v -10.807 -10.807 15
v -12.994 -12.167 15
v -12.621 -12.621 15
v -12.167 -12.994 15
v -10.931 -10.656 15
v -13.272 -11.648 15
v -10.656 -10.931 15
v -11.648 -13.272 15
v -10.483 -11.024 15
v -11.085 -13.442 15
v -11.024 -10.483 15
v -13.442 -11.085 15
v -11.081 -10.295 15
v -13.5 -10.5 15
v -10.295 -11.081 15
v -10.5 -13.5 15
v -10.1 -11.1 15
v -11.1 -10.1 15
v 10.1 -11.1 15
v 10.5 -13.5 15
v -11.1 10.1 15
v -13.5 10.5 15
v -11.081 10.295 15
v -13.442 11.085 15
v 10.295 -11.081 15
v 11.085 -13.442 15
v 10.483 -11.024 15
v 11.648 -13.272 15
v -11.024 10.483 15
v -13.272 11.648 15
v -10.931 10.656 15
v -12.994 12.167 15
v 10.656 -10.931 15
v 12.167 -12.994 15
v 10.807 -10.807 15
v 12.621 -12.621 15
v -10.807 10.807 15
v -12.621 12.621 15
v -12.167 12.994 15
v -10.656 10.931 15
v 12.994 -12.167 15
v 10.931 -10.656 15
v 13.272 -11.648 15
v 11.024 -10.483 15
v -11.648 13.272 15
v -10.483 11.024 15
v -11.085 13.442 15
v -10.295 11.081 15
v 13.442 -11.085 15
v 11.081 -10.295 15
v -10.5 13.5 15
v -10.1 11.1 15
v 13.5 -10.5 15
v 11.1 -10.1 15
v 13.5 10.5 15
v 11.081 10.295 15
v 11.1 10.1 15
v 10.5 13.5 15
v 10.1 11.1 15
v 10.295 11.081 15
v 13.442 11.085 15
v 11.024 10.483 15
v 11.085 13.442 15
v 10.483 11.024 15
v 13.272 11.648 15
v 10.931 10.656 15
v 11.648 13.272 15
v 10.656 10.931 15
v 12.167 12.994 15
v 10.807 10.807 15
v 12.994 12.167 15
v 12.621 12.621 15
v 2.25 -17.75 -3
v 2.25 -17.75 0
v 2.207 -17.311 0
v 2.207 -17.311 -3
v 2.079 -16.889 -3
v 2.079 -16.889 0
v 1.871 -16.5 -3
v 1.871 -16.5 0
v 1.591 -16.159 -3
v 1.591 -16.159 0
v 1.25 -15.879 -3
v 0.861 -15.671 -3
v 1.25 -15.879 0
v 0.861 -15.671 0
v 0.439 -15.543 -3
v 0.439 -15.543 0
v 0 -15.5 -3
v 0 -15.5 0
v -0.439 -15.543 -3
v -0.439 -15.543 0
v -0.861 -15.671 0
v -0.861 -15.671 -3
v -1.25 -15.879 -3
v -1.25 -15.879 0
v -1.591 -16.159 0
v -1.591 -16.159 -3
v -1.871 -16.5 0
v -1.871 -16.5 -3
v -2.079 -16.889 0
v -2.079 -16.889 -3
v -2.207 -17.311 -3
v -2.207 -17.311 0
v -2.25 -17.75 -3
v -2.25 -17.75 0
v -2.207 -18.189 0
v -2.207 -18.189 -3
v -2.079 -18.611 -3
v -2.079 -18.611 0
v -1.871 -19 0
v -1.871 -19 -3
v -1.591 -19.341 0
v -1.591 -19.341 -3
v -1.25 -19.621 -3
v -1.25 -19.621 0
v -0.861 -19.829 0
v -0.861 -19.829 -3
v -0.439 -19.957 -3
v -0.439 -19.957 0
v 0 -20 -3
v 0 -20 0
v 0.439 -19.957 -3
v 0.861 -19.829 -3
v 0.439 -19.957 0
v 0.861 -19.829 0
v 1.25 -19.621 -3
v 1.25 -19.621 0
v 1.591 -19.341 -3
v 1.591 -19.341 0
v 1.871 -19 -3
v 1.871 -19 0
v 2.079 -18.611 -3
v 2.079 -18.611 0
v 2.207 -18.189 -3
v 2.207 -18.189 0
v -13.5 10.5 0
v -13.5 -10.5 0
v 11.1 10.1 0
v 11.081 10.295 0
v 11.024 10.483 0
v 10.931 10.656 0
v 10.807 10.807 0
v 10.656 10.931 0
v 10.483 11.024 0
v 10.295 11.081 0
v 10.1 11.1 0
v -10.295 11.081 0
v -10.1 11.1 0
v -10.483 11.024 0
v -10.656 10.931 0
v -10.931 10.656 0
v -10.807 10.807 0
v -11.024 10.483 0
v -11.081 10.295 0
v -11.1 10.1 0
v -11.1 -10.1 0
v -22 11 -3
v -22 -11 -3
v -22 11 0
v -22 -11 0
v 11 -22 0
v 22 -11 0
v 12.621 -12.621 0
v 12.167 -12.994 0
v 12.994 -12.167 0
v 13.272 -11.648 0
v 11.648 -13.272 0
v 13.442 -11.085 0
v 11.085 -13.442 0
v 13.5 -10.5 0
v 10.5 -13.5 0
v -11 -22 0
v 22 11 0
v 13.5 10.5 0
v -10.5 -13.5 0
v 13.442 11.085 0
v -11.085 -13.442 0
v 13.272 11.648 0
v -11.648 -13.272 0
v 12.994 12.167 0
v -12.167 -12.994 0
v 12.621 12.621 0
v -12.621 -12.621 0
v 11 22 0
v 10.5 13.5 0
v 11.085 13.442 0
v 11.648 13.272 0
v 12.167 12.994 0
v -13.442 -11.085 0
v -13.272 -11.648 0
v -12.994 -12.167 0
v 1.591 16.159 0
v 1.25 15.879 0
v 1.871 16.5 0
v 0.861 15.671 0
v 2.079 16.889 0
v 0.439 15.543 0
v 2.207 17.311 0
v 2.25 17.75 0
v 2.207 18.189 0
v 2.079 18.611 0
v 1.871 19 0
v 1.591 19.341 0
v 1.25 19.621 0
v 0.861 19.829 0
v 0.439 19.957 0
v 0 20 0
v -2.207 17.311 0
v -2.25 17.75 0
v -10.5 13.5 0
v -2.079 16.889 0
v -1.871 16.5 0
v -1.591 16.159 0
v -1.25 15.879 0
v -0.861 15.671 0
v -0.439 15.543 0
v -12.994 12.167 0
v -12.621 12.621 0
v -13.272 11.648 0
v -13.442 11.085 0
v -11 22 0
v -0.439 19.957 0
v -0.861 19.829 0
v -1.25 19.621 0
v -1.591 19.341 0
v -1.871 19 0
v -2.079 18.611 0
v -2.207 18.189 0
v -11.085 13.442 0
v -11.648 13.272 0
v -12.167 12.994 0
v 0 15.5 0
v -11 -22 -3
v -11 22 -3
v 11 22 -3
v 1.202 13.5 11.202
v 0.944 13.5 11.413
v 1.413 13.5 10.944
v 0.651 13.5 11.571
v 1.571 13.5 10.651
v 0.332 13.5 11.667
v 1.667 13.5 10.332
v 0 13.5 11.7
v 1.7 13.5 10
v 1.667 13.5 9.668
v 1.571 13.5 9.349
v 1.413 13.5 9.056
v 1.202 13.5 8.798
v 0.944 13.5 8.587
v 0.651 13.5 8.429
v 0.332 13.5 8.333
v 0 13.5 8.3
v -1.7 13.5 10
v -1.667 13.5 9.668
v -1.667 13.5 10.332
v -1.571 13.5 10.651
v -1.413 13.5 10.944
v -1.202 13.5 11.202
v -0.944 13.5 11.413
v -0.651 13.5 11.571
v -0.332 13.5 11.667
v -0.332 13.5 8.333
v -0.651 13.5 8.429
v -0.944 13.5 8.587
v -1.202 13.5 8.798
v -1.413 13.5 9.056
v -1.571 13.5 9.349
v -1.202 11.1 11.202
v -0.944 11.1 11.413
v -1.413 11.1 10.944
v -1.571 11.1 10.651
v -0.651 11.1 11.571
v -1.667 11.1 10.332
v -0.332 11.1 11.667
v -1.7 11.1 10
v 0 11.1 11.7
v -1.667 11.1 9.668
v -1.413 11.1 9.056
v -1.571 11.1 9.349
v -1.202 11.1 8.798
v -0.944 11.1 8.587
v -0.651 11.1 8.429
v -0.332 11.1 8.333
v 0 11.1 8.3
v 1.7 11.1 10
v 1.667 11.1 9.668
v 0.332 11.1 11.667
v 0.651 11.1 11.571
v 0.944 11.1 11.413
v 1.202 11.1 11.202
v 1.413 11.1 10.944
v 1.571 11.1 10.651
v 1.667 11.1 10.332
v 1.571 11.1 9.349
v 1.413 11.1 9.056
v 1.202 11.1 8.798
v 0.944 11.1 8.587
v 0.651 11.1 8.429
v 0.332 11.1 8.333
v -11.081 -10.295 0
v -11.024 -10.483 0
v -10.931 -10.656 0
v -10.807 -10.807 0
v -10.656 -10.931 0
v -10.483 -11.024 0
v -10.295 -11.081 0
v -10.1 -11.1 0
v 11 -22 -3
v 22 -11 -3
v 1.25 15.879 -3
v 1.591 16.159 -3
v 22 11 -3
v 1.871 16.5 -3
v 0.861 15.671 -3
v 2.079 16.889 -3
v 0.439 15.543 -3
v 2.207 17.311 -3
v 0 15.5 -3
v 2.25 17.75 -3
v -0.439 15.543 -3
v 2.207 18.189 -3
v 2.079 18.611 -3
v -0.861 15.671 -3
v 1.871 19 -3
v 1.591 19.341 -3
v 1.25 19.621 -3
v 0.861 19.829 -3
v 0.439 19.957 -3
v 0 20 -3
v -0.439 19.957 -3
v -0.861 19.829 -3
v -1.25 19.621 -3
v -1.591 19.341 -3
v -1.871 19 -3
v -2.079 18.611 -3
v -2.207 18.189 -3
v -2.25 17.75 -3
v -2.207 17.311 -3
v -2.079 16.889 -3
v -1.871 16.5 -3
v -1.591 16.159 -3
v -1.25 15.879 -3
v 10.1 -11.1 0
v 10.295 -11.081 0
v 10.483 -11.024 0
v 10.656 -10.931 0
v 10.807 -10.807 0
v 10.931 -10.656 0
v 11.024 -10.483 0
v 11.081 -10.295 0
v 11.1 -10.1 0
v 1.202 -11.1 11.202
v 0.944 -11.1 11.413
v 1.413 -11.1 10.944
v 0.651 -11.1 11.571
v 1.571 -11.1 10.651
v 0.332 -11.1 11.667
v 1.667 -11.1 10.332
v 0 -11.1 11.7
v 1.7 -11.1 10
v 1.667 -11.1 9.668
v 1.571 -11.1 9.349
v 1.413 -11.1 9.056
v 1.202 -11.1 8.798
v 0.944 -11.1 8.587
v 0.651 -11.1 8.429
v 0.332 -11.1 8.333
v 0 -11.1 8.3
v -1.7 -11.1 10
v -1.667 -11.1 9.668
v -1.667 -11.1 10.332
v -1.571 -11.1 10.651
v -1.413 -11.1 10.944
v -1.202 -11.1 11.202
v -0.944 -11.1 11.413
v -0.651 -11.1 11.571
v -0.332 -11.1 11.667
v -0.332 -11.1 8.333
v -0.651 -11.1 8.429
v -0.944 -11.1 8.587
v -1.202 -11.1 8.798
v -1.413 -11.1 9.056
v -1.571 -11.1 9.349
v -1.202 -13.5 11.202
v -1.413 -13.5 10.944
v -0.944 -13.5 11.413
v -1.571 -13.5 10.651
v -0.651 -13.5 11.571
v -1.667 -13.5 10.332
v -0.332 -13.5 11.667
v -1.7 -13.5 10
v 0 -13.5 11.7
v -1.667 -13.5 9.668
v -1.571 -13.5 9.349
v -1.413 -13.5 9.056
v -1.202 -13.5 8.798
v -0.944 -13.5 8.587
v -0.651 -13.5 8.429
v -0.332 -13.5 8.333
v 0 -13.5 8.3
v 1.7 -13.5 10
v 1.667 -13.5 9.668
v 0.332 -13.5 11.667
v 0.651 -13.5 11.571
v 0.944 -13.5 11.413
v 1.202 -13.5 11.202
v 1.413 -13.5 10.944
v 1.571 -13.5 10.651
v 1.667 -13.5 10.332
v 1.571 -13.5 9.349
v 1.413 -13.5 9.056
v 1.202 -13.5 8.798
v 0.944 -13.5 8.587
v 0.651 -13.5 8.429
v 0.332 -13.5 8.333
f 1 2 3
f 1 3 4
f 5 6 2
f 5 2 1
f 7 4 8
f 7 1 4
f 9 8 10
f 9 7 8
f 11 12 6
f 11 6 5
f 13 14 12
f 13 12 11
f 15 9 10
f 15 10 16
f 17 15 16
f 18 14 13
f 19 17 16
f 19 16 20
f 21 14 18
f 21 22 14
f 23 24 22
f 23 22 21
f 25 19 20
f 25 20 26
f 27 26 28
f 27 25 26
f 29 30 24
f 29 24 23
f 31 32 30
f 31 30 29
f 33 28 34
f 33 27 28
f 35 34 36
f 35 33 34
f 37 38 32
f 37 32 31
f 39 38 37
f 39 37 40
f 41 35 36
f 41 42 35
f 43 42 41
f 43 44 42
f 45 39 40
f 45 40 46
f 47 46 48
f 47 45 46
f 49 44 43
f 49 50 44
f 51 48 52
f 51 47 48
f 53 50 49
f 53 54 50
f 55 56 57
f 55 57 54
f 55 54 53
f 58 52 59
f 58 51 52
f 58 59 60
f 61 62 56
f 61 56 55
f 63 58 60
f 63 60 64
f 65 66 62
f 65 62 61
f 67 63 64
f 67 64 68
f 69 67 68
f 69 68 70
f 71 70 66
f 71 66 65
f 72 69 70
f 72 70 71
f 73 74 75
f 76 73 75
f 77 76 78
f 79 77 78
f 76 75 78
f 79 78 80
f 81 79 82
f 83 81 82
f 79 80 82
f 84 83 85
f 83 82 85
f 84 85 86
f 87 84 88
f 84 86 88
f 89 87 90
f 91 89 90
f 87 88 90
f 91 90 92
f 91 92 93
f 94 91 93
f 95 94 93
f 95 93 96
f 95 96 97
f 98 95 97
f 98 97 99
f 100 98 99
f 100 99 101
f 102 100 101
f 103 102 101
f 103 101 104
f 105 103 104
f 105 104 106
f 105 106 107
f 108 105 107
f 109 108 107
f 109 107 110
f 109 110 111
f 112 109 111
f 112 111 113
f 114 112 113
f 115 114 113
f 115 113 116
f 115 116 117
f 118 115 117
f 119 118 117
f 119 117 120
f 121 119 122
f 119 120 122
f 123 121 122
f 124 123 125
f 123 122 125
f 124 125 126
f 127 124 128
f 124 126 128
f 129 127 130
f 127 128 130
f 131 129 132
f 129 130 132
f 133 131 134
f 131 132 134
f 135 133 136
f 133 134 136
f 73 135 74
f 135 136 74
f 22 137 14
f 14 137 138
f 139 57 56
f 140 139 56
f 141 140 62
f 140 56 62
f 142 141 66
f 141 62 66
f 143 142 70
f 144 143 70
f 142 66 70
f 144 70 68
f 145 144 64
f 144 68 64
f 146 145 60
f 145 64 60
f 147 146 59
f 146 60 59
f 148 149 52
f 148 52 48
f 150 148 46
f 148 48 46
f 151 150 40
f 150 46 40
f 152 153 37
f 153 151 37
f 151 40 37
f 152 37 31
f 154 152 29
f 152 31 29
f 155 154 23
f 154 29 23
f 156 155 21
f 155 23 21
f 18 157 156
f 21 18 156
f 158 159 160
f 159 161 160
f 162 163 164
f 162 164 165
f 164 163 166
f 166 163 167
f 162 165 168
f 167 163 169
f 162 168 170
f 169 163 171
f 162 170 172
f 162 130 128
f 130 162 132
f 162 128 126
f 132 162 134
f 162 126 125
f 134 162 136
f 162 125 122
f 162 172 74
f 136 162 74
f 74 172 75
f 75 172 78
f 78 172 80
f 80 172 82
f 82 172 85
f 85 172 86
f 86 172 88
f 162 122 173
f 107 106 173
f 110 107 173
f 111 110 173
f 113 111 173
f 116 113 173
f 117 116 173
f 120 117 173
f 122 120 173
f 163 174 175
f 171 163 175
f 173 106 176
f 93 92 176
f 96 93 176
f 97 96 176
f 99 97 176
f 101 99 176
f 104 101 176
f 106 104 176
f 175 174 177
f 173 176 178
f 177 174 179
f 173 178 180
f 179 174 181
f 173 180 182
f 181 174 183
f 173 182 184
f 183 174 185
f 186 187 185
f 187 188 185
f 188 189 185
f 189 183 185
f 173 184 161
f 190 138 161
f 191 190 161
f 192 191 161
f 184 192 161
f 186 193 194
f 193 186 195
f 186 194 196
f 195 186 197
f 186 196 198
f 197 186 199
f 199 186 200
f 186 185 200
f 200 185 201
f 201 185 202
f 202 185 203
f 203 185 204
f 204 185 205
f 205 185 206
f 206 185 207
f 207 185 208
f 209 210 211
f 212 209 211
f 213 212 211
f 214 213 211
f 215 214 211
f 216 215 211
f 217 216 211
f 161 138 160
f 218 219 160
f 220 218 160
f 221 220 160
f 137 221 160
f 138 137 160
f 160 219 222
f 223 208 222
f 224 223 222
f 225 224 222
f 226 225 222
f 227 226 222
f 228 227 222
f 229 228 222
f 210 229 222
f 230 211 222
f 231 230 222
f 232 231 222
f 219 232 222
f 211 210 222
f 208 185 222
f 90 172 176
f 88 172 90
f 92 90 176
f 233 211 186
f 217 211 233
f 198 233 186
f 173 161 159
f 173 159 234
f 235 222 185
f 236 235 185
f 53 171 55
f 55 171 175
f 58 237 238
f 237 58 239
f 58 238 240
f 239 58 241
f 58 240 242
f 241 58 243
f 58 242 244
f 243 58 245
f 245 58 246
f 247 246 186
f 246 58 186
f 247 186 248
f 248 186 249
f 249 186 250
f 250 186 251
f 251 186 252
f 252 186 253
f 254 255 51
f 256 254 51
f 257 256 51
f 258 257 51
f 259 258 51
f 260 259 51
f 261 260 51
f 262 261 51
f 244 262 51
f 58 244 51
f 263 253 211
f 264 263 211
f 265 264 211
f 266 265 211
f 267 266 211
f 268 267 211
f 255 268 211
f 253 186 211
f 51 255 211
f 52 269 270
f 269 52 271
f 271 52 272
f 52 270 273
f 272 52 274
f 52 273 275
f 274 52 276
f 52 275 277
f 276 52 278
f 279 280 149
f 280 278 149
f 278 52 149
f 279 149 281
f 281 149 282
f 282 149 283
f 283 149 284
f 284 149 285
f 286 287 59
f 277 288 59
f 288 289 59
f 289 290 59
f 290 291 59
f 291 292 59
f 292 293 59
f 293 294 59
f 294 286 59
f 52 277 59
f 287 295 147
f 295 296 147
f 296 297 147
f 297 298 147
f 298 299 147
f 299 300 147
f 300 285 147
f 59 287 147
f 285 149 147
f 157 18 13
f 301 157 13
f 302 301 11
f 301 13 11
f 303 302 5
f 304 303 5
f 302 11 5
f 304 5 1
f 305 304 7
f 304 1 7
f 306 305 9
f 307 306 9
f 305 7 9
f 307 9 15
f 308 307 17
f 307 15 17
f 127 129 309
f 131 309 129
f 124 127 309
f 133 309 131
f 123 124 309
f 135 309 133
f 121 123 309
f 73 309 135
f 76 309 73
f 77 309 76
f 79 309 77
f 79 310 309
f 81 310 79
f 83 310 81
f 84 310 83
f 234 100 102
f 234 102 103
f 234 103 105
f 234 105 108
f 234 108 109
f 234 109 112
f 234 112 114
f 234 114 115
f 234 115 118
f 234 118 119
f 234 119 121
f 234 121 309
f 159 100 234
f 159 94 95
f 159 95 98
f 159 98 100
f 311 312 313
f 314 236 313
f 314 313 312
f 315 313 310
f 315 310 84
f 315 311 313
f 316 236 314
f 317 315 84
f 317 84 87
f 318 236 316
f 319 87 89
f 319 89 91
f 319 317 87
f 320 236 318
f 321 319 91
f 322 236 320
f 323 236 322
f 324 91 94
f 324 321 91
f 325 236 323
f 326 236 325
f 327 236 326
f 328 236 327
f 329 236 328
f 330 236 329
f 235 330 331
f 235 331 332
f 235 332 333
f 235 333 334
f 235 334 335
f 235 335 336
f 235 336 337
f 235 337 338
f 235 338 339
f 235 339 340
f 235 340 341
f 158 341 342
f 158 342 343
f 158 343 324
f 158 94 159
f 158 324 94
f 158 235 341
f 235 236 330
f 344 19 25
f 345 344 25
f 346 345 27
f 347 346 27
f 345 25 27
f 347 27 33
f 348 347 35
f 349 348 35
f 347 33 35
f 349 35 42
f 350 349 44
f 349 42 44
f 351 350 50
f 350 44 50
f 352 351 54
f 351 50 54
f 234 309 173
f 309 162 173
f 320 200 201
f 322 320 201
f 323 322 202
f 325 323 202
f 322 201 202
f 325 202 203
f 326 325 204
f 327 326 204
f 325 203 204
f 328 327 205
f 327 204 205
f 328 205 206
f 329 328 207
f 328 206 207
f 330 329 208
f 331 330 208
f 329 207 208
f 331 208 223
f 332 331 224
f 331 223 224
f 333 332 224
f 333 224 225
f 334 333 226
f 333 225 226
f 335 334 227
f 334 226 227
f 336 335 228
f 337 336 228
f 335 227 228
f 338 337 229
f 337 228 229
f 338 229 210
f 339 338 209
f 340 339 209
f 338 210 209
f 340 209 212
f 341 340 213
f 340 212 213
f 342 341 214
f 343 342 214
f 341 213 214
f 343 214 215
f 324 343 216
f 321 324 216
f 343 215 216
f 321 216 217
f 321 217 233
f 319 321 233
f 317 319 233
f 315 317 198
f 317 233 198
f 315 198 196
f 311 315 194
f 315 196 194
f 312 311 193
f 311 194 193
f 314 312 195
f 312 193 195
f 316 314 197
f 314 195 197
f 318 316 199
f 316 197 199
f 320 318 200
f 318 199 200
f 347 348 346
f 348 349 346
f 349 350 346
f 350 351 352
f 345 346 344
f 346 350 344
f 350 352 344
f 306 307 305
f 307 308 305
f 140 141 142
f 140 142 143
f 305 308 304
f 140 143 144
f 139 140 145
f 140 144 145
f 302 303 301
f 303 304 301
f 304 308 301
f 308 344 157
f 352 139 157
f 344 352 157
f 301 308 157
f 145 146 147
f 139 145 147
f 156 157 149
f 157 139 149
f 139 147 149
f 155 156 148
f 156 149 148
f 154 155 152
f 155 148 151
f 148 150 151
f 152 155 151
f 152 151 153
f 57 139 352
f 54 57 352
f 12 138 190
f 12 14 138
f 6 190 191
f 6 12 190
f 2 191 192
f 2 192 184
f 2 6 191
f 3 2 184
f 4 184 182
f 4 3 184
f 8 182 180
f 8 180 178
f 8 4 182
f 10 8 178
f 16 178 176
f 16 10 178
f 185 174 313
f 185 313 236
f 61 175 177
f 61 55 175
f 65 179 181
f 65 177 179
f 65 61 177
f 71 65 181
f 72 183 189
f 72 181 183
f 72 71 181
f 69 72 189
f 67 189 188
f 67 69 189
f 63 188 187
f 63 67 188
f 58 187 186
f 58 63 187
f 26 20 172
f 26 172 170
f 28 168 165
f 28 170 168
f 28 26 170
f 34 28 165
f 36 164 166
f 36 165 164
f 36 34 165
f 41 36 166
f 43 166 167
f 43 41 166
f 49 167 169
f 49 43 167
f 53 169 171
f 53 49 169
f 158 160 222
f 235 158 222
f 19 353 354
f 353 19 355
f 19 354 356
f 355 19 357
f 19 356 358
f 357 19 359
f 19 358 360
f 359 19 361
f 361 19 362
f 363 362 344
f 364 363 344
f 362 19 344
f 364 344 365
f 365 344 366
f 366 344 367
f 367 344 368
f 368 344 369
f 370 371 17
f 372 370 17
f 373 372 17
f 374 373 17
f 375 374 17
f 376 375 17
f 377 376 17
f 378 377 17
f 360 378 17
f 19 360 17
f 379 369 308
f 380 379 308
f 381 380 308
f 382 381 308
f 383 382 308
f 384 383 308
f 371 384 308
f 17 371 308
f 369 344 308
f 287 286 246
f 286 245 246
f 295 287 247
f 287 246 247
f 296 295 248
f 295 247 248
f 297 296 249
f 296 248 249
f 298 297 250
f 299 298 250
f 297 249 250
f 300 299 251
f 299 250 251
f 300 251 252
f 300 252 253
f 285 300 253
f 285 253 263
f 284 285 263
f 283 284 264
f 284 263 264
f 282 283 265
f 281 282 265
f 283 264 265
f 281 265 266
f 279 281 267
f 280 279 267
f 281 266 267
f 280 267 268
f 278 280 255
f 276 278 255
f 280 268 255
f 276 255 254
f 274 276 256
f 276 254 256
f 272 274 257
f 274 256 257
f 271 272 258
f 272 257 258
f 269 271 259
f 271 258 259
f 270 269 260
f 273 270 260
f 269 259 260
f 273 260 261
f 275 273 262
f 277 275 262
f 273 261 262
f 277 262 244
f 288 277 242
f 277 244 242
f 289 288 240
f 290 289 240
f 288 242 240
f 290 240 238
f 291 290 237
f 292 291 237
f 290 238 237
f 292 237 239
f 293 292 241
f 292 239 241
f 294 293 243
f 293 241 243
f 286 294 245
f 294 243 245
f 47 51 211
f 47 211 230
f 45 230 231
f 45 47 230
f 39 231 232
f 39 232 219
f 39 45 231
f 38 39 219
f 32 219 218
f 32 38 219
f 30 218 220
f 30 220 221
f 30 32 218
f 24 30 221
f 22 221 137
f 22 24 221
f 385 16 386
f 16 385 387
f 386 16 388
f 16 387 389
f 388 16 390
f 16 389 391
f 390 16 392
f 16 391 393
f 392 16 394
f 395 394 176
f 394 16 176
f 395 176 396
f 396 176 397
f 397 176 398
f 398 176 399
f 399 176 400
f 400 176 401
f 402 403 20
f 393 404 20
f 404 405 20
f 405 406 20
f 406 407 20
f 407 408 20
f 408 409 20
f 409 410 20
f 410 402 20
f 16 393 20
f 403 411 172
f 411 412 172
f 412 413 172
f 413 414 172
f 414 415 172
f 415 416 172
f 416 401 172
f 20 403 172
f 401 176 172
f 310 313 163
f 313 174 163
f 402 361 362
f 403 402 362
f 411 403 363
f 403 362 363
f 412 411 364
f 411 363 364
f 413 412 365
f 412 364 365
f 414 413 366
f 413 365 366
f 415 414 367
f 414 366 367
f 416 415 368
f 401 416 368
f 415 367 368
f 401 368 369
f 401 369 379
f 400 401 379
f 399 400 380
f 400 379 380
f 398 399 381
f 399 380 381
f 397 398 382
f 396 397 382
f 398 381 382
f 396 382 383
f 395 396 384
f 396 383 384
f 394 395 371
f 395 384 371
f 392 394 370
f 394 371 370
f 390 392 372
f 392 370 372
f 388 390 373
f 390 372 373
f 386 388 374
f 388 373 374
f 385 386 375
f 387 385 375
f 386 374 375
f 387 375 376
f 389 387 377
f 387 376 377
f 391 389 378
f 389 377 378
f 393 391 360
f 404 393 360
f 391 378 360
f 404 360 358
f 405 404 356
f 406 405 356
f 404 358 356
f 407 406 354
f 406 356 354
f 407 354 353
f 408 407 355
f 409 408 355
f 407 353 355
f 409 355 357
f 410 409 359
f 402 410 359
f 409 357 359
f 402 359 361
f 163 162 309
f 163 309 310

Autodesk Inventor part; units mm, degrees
ref_plane "YZ Plane" through (0, 0, 0) normal (1, 0, 0) x (0, 1, 0)
ref_plane "XZ Plane" through (0, 0, 0) normal (0, 1, 0) x (-1, 0, 0)
ref_plane "XY Plane" through (0, 0, 0) normal (0, 0, 1) x (1, 0, 0)
sketch "スケッチ1" plane through (0, 0, 0) normal (1, 0, 0) x (0, 1, 0)
  point P0 (0, 0)
sketch "スケッチ2" plane through (0, 0, 0) normal (0, 0, 1) x (1, 0, 0)
  line L0 (-11.1, 11.1) -> (11.1, 11.1)
  line L1 (11.1, 11.1) -> (11.1, -11.1)
  line L2 (11.1, -11.1) -> (-11.1, -11.1)
  line L3 (-11.1, -11.1) -> (-11.1, 11.1)
  line L4 (-11.1, 11.1) -> (11.1, -11.1) construction
  line L5 (11.1, 11.1) -> (-11.1, -11.1) construction
  line L6 (-13.5, -13.5) -> (13.5, -13.5)
  line L7 (13.5, -13.5) -> (13.5, 13.5)
  line L8 (13.5, 13.5) -> (-13.5, 13.5)
  line L9 (-13.5, 13.5) -> (-13.5, -13.5)
  line L10 (-13.5, -13.5) -> (13.5, 13.5) construction
  line L11 (13.5, -13.5) -> (-13.5, 13.5) construction
  point P0 (0, 0)
  dimension "d0" = 22.2
  dimension "d1" = 22.2
  dimension "d2" = 27
  dimension "d3" = 27
extrude "押し出し1" add sketch "スケッチ2" along normal blind 15
sketch "スケッチ3" plane through (-13.5, 13.5, 0) normal (0, 1, 0) x (1, 0, 0)
  circle A0 centre (13.5, -10) radius 1.7
  point P0 (13.5, 0)
  dimension "d6" = 3.4
extrude "押し出し2" cut sketch "スケッチ3" against normal blind 30
sketch "スケッチ4" plane through (0, 0, 0) normal (0, 0, -1) x (-1, 0, 0)
  line L0 (22, 22) -> (-22, 22)
  line L1 (-22, 22) -> (-22, -22)
  line L2 (-22, -22) -> (22, -22)
  line L3 (22, -22) -> (22, 22)
  line L4 (22, 22) -> (-22, -22) construction
  line L5 (-22, 22) -> (22, -22) construction
  point P0 (0, 0)
  dimension "d9" = 44
  dimension "d10" = 44
extrude "押し出し3" add sketch "スケッチ4" along normal blind 3
sketch "スケッチ5" plane through (0, 0, 0) normal (0, 0, 1) x (1, 0, 0)
  circle A0 centre (0, 17.75) radius 2.25
  circle A1 centre (0, -17.75) radius 2.25
  point P0 (0, 0)
  dimension "d13" = 4.5
  dimension "d14" = 4.5
extrude "押し出し4" cut sketch "スケッチ5" against normal blind 3
sketch "スケッチ6" plane through (0, 0, 0) normal (0, 0, 1) x (1, 0, 0)
  line L0 (-22, 22) -> (22, 22) projected
  line L1 (22, 22) -> (11, 22)
  line L2 (22, 22) -> (22, 11)
  line L3 (22, 11) -> (11, 22)
  line L4 (22, -22) -> (-22, -22) projected
  line L5 (22, -22) -> (22, -11)
  line L6 (22, 22) -> (22, -22) projected
  line L7 (22, -22) -> (11, -22)
  line L8 (11, -22) -> (22, -11)
  line L9 (-22, -22) -> (-22, 22) projected
  line L10 (-22, 22) -> (-11, 22)
  line L11 (-22, 22) -> (-22, 11)
  line L12 (-22, 11) -> (-11, 22)
  line L13 (-22, -22) -> (-22, -11)
  line L14 (-22, -22) -> (-11, -22)
  line L15 (-22, -11) -> (-11, -22)
  point P0 (0, 0)
  dimension "d17" = 11
  dimension "d18" = 11
  dimension "d19" = 11
  dimension "d20" = 11
  dimension "d21" = 11
  dimension "d22" = 11
  dimension "d23" = 11
extrude "押し出し5" cut sketch "スケッチ6" against normal blind 3 contours L0 L12 L9 | L0 L2 L3 | L15 L4 L9 | L5 L4 L8
fillet "フィレット1" radius 3 4 edges at (13.5, -13.5, 7.5) (13.5, 13.5, 7.5) (-13.5, -13.5, 7.5) (-13.5, 13.5, 7.5)
fillet "フィレット2" radius 1 4 edges at (-11.1, 11.1, 7.5) (-11.1, -11.1, 7.5) (11.1, 11.1, 7.5) (11.1, -11.1, 7.5)
properties part number "rod_fixture_vp16"
